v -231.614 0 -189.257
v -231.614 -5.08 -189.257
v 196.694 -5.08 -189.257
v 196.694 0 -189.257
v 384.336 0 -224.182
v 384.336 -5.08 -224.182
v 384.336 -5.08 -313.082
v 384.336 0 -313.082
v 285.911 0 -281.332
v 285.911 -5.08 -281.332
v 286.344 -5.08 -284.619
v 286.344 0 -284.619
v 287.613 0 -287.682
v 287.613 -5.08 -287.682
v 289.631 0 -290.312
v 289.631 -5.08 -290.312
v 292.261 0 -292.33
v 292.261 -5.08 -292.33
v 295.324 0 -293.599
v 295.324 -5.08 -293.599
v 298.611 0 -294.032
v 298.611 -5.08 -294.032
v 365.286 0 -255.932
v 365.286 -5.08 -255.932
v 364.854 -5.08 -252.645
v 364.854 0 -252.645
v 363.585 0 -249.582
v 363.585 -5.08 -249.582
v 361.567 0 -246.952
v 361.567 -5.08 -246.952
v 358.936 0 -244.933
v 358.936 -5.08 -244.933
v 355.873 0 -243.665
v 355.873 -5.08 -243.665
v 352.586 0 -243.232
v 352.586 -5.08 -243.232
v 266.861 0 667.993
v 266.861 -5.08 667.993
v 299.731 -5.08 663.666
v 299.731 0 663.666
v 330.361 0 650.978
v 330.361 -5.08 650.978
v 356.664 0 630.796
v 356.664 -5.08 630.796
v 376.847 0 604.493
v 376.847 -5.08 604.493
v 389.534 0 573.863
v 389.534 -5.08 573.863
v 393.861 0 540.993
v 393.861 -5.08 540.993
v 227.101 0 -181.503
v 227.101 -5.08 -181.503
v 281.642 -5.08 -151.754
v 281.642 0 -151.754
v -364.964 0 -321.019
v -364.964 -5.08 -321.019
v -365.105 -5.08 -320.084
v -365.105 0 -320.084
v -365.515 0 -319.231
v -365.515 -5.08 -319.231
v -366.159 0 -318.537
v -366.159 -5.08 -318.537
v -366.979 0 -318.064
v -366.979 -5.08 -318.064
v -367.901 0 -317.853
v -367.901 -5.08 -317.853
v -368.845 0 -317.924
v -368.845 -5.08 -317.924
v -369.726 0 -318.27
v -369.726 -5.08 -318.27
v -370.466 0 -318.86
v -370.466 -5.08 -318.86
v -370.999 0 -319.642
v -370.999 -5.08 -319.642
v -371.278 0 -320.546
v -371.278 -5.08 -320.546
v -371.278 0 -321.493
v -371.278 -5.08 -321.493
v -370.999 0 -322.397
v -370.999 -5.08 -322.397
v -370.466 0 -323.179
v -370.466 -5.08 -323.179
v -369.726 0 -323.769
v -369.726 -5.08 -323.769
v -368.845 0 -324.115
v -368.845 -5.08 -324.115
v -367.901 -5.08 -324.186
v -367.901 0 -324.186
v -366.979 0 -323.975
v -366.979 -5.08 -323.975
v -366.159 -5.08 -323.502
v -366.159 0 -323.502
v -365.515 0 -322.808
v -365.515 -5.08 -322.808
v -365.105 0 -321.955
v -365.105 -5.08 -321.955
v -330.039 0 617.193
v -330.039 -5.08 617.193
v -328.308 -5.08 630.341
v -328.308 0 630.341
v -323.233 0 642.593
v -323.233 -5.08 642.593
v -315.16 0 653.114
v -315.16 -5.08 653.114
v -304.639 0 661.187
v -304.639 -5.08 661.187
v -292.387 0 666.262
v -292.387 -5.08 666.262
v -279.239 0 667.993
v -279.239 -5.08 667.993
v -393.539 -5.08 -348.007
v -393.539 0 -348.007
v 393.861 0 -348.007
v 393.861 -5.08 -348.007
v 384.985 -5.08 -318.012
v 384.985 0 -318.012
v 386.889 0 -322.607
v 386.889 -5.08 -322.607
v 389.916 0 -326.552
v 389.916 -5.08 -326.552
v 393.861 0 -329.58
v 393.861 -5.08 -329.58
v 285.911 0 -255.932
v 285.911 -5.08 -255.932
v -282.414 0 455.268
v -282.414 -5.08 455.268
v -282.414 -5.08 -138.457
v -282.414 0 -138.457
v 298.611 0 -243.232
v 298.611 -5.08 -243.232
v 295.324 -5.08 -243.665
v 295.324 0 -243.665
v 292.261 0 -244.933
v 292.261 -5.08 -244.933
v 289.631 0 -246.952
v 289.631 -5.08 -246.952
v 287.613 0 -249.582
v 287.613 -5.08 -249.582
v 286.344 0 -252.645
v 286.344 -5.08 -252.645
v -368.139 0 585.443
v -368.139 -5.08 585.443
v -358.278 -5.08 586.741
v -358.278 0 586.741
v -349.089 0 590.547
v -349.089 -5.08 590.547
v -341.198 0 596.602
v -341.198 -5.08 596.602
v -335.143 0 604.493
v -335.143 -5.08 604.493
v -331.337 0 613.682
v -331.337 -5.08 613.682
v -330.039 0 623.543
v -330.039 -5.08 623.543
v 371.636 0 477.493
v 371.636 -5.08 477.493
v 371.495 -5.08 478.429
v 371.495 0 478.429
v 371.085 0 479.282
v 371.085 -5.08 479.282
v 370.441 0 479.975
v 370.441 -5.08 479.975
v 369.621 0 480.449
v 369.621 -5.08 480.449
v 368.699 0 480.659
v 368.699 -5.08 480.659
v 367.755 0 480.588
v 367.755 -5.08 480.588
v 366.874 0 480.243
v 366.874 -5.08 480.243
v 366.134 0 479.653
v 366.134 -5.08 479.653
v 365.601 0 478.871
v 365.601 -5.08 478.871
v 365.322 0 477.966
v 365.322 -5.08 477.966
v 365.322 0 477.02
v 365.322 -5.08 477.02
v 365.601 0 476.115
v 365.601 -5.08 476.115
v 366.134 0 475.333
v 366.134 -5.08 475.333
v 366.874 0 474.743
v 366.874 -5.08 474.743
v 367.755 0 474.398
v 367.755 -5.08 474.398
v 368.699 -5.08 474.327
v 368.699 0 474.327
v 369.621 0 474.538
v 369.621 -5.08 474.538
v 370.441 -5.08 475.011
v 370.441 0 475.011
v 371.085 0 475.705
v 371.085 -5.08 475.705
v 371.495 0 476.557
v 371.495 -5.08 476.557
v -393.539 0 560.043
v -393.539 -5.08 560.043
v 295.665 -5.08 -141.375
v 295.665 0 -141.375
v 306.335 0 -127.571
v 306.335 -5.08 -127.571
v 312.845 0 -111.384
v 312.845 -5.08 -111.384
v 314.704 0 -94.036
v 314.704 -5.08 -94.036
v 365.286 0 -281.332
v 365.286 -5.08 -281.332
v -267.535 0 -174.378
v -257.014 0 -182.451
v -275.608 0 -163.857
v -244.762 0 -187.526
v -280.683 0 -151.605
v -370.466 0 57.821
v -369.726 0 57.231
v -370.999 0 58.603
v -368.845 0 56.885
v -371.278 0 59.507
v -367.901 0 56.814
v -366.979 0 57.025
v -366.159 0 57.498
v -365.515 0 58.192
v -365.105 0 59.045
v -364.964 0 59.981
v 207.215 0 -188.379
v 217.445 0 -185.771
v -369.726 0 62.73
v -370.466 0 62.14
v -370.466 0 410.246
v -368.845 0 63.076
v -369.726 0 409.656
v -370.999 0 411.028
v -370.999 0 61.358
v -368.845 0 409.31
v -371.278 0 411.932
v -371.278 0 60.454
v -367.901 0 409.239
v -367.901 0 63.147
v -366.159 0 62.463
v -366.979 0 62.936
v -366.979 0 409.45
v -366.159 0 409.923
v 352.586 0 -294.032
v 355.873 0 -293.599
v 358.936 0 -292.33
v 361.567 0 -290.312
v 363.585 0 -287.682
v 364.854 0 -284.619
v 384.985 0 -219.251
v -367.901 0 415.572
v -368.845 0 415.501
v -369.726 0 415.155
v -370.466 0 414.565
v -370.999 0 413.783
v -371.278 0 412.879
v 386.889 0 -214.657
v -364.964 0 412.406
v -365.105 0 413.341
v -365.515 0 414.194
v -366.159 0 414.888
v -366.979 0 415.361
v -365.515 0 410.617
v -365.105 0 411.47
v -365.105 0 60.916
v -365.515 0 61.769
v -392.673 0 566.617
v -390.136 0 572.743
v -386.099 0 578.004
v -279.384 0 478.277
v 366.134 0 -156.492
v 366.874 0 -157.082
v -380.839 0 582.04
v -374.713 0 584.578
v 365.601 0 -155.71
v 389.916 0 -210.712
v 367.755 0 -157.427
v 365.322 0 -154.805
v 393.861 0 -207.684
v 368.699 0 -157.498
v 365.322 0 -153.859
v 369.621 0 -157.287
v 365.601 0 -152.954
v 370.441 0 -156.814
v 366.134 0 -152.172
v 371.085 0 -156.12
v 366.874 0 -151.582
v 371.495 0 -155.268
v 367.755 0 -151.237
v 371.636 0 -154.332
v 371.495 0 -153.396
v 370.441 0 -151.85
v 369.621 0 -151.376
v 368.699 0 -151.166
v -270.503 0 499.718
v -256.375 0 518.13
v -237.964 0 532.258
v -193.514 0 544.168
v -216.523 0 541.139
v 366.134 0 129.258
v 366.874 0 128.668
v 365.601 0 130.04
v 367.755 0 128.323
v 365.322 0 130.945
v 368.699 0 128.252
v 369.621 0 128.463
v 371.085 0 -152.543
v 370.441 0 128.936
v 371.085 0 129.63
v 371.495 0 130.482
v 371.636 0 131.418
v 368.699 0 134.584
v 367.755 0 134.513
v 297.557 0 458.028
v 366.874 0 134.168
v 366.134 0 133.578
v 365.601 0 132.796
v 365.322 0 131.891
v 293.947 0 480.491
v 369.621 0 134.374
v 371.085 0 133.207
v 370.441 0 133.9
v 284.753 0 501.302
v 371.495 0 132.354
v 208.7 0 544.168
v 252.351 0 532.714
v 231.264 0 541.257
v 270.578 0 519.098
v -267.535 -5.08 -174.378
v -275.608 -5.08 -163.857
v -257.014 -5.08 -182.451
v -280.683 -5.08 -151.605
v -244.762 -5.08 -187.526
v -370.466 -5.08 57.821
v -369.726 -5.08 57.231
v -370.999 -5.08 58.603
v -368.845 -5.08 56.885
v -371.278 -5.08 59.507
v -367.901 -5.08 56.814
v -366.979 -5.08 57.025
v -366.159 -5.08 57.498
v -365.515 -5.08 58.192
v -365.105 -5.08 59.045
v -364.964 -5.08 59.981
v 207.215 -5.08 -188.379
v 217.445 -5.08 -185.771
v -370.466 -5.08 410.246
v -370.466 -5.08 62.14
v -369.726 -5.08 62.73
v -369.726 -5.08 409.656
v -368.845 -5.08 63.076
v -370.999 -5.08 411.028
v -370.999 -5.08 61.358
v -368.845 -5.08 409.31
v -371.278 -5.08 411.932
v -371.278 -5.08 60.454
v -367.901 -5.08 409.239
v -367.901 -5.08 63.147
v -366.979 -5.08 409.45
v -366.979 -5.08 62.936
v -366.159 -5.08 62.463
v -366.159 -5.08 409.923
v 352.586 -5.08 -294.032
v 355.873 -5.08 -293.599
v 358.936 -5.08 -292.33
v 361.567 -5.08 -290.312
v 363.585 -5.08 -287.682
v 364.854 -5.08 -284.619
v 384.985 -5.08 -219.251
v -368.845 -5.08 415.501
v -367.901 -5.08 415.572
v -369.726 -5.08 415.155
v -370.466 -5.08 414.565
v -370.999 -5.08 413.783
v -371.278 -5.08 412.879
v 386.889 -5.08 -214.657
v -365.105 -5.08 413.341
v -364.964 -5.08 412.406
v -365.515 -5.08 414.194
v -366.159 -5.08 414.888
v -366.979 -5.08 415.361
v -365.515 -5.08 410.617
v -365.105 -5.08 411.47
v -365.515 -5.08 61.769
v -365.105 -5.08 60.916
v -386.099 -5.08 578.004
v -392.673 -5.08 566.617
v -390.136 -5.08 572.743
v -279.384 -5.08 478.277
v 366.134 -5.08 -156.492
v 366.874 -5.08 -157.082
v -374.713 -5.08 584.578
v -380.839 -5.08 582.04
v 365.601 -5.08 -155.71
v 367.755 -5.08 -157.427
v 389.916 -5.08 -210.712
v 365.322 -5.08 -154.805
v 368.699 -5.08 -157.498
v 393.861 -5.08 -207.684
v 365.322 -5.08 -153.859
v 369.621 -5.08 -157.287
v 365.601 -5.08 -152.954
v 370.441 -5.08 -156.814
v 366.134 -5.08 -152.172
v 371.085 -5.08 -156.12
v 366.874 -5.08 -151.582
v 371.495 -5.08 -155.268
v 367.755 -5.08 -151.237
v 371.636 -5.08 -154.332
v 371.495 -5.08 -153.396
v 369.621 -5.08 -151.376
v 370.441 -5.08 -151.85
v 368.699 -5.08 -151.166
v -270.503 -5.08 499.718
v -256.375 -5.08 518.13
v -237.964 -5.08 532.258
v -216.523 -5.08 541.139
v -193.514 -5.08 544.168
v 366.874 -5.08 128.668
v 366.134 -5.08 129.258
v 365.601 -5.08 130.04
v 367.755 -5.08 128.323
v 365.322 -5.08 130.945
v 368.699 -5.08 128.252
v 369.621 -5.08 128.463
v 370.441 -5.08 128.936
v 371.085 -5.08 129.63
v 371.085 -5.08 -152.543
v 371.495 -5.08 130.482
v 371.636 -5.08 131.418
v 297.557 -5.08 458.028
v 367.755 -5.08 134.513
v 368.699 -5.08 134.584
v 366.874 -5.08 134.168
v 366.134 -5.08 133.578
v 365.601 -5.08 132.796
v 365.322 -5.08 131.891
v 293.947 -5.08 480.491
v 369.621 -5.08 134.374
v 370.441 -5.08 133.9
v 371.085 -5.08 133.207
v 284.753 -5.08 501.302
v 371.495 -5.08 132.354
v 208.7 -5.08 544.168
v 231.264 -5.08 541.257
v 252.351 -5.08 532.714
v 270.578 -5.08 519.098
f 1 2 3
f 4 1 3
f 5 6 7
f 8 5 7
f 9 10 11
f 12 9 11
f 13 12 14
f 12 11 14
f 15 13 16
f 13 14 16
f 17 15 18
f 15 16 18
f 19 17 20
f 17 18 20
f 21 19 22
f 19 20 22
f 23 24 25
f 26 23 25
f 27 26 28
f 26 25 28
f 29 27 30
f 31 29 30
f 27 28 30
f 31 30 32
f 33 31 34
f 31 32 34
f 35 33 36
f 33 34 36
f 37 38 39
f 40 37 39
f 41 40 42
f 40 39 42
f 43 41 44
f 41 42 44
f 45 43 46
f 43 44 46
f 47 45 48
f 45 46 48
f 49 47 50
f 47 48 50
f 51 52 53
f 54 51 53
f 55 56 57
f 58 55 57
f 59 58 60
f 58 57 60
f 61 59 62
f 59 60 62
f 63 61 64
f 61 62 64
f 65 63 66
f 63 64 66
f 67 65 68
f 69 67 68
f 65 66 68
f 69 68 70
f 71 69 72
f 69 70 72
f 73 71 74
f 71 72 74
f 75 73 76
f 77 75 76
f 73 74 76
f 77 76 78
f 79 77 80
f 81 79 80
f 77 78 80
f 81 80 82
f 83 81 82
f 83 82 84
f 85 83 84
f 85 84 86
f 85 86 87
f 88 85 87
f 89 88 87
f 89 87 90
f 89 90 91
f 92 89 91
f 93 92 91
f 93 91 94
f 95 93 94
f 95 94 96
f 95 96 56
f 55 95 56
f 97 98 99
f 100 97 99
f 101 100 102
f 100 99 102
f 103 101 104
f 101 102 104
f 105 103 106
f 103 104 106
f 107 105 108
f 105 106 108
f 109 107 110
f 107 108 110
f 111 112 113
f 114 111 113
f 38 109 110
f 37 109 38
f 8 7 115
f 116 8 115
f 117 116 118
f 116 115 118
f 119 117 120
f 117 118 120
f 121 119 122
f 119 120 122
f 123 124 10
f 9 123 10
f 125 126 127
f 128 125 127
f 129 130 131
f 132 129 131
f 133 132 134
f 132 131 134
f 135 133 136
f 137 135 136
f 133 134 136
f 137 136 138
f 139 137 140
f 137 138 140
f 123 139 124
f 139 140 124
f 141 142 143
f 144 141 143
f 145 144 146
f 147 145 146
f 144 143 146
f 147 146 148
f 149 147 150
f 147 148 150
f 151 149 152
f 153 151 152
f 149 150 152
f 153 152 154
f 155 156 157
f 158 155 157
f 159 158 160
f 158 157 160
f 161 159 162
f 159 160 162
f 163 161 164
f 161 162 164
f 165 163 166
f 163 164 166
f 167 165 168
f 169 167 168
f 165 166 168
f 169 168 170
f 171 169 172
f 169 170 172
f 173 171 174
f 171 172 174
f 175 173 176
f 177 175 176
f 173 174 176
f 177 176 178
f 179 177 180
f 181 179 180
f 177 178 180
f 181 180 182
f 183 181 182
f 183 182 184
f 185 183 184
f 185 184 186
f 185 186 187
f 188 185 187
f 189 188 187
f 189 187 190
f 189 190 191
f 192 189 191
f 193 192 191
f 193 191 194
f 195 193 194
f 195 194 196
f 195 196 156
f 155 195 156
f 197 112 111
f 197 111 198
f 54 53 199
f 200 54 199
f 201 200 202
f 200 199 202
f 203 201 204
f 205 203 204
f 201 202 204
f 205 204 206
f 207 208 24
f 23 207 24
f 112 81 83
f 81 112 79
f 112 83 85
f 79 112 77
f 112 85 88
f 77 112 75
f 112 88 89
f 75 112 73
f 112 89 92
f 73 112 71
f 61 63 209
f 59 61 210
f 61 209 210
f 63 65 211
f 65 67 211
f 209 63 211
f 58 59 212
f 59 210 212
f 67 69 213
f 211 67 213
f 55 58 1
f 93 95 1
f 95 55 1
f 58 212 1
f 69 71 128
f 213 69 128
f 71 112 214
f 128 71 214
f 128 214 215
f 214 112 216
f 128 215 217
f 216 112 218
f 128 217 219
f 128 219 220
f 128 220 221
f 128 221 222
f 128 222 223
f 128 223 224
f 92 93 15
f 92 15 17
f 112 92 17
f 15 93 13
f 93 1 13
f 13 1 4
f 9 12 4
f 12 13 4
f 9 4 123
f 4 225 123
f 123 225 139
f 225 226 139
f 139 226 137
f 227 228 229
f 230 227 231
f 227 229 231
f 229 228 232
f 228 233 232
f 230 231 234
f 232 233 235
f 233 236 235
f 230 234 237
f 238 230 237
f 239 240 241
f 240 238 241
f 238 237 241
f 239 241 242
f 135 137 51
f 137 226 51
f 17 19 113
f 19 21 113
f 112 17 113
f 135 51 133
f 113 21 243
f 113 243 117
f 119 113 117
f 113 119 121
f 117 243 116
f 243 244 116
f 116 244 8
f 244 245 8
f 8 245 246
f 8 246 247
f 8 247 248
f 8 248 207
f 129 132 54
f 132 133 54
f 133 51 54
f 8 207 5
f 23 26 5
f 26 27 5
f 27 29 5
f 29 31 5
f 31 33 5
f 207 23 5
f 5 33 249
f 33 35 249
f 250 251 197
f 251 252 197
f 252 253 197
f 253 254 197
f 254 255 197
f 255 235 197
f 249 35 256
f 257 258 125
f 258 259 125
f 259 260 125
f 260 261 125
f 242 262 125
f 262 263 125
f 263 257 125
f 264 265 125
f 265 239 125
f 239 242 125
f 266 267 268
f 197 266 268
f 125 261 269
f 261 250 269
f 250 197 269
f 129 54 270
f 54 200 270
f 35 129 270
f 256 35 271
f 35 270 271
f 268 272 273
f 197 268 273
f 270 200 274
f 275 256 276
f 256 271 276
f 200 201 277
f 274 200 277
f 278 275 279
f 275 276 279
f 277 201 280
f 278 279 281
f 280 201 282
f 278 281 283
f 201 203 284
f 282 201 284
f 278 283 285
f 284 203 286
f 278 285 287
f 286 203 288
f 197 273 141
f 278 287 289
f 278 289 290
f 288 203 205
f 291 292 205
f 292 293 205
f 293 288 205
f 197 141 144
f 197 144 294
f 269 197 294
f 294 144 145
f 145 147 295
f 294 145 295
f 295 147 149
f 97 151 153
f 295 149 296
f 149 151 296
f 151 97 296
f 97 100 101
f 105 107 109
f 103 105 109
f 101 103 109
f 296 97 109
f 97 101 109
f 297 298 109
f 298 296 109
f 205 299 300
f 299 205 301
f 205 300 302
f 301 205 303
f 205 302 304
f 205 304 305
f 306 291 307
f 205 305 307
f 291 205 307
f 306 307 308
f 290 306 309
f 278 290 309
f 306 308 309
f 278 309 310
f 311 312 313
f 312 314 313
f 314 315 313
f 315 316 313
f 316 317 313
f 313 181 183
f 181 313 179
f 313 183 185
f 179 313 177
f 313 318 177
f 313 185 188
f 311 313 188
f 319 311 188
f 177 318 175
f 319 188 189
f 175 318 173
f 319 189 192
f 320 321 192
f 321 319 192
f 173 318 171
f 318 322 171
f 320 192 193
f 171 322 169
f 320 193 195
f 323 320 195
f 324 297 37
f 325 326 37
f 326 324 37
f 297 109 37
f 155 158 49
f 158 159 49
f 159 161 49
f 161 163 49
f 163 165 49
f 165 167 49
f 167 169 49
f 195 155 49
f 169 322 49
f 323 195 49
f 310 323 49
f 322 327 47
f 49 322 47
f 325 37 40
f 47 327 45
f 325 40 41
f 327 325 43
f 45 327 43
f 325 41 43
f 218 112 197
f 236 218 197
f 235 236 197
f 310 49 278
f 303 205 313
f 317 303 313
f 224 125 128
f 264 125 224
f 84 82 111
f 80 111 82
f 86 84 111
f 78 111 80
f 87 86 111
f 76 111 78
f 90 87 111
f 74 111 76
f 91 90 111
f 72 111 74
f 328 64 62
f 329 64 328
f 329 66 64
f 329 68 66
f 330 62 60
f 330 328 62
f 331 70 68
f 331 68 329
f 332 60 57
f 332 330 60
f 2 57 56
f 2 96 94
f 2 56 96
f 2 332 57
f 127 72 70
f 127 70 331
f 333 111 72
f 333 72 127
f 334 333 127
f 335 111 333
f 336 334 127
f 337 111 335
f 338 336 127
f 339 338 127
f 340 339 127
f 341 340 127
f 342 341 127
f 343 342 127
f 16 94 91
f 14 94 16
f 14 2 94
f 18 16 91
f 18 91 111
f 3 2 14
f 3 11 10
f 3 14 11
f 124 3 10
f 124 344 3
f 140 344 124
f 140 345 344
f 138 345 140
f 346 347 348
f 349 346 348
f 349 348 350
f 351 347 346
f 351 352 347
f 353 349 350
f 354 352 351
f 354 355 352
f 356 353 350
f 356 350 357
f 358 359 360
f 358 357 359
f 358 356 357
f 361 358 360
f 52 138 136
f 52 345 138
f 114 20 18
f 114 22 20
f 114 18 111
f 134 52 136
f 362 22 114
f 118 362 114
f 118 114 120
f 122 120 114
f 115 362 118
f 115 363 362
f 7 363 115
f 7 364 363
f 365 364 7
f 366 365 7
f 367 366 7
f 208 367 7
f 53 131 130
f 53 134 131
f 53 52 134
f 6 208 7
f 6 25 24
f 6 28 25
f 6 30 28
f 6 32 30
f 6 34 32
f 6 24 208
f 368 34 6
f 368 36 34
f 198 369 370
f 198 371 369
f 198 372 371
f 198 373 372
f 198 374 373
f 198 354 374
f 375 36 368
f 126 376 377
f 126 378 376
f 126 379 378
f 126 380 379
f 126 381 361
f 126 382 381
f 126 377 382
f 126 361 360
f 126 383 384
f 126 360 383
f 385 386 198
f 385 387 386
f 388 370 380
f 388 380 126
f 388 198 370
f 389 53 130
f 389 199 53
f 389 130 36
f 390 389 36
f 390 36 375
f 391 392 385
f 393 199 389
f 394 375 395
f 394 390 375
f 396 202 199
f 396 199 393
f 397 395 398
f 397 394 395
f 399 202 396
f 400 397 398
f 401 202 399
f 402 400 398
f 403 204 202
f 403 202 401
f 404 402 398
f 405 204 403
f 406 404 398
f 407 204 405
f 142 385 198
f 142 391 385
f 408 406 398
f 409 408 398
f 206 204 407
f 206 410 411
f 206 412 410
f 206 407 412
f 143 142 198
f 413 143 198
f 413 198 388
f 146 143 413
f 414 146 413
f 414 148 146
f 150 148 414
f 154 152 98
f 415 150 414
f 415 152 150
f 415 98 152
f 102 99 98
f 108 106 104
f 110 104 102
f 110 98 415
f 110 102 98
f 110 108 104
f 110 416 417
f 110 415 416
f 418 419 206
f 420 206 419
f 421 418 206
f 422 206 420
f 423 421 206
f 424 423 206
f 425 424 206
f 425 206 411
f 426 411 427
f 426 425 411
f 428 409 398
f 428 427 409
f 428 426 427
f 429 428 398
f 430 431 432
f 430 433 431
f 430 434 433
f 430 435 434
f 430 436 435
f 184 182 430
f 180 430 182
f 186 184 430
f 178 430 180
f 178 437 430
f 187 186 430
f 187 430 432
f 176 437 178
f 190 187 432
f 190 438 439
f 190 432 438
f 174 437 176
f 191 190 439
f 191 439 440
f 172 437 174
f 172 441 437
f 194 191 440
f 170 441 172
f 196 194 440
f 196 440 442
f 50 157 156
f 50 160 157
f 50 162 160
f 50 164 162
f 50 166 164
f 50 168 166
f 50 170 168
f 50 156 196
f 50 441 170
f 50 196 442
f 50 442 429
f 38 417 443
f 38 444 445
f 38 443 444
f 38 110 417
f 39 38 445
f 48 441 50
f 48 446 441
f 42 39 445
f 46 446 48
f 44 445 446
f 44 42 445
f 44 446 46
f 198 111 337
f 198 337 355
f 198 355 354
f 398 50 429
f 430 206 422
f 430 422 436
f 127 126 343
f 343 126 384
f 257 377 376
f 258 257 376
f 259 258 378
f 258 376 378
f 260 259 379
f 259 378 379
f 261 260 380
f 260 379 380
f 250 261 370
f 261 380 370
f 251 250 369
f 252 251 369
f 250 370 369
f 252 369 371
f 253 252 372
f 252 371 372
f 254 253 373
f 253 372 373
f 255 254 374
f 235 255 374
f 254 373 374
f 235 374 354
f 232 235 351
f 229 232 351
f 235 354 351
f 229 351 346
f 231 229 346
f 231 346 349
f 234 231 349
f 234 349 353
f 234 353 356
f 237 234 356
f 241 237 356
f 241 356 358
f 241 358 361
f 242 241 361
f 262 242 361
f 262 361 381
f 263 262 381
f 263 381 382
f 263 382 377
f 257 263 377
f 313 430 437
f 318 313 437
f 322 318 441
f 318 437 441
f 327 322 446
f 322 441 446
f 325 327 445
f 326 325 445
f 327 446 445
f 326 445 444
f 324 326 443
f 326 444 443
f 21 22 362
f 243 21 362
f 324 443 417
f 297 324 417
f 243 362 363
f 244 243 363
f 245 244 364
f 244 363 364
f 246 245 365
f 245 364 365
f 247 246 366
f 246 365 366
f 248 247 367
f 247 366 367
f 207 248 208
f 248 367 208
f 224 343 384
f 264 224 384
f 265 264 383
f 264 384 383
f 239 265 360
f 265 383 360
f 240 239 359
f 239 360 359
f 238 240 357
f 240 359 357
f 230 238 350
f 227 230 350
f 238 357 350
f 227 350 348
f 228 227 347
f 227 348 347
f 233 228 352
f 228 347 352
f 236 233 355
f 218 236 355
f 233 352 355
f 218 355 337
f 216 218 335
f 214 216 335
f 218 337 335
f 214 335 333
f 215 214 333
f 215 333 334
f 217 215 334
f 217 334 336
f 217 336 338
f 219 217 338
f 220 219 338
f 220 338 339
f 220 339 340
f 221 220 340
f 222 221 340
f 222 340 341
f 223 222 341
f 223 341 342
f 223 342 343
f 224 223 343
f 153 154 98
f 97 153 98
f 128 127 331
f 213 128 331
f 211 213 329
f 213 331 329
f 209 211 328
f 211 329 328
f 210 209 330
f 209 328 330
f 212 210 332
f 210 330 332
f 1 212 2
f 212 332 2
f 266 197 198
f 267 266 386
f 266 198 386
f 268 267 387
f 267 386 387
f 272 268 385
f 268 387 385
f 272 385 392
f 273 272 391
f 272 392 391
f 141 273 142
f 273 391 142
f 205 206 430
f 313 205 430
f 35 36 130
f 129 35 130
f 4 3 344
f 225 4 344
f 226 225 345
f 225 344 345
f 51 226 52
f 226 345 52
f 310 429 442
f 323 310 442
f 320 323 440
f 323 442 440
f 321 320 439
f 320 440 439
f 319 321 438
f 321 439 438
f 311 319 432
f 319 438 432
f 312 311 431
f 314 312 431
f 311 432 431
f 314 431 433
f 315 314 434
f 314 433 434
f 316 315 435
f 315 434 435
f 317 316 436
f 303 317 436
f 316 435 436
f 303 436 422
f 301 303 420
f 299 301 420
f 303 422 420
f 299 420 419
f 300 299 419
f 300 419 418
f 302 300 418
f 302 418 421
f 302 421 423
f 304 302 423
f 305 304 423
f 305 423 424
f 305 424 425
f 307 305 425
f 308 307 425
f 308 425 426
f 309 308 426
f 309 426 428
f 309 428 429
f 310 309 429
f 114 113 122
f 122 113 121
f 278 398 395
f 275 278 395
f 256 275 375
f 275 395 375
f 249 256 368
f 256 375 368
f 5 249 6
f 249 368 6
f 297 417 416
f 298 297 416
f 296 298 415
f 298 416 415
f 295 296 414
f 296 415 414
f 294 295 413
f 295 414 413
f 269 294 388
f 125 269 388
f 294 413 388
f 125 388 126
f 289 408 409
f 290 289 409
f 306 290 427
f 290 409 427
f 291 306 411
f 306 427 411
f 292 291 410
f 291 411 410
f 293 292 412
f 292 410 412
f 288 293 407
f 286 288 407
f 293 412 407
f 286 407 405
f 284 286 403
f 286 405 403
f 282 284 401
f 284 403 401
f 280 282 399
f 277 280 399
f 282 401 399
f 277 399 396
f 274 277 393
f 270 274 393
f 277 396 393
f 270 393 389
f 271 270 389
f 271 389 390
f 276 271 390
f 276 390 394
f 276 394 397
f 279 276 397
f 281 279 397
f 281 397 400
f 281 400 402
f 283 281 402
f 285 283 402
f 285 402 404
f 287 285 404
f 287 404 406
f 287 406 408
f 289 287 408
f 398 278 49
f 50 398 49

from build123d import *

# Parameters (mm, degrees)
F0_W      = 787.4
F0_H      = 1016
F1_DEPTH  = 5.08
F3_DEPTH  = 5.081
F5_DEPTH  = 5.081
F7_DEPTH  = 5.081
F9_DEPTH  = 5.081
F11_DEPTH = 5.081
F12_DEPTH = 25.4
F14_DEPTH = 5.081
F16_DEPTH = 5.081
F17_R     = 3.175
F18_DEPTH = 5.081


with BuildPart() as f1:
    # F0 (on Front) → F1 (new body)
    with BuildSketch(Plane.XZ):
        with Locations((0.161311, 159.993043)):
            Rectangle(F0_W, F0_H)
    extrude(amount=F1_DEPTH)

    # F2 (on face) → F3 (cut, through all)
    with BuildSketch(Plane.XZ.offset(5.08)):
        with BuildLine():
            Line((352.586311, -243.231957), (298.611311, -243.231957))
            ThreePointArc((298.611311, -243.231957), (289.631055, -246.951701), (285.911311, -255.931957))
            Line((285.911311, -255.931957), (285.911311, -281.331957))
            ThreePointArc((285.911311, -281.331957), (289.631055, -290.312213), (298.611311, -294.031957))
            Line((298.611311, -294.031957), (352.586311, -294.031957))
            ThreePointArc((352.586311, -294.031957), (361.566567, -290.312213), (365.286311, -281.331957))
            Line((365.286311, -281.331957), (365.286311, -255.931957))
            ThreePointArc((365.286311, -255.931957), (361.566567, -246.951701), (352.586311, -243.231957))
        make_face()
    extrude(amount=-F3_DEPTH, mode=Mode.SUBTRACT)

    # F4 (on face) → F5 (cut, through all)
    with BuildSketch(Plane.XZ.offset(5.08)):
        with BuildLine():
            ThreePointArc((403.386311, -205.131957), (389.915926, -210.711573), (384.336311, -224.181957))
            Line((384.336311, -224.181957), (384.336311, -313.081957))
            ThreePointArc((384.336311, -313.081957), (389.915926, -326.552341), (403.386311, -332.131957))
            Line((403.386311, -332.131957), (403.386311, -205.131957))
        make_face()
    extrude(amount=-F5_DEPTH, mode=Mode.SUBTRACT)

    # F6 (on face) → F7 (cut, through all)
    with BuildSketch(Plane.XZ.offset(5.08)):
        with BuildLine():
            Line((208.69992, 544.168043), (-193.513689, 544.168043))
            ThreePointArc((-193.513689, 544.168043), (-256.375482, 518.129836), (-282.413689, 455.268043))
            Line((-282.413689, 455.268043), (-282.413689, -138.456957))
            ThreePointArc((-282.413689, -138.456957), (-267.534714, -174.377981), (-231.613689, -189.256957))
            Line((-231.613689, -189.256957), (196.694191, -189.256957))
            ThreePointArc((196.694191, -189.256957), (212.384245, -187.288024), (227.101301, -181.503326))
            Line((227.101301, -181.503326), (281.64154, -151.754104))
            ThreePointArc((281.64154, -151.754104), (306.334633, -127.570652), (314.703824, -94.036418))
            Line((314.703824, -94.036418), (297.557071, 458.027888))
            ThreePointArc((297.557071, 458.027888), (270.578268, 519.098131), (208.69992, 544.168043))
        make_face()
    extrude(amount=-F7_DEPTH, mode=Mode.SUBTRACT)

    # F8 (on face) → F9 (cut, through all)
    with BuildSketch(Plane.XZ.offset(5.08)):
        with BuildLine():
            Line((-330.038689, 667.993043), (-393.538689, 667.993043))
            Line((-393.538689, 667.993043), (-393.538689, 585.443043))
            Line((-393.538689, 585.443043), (-368.138689, 585.443043))
            ThreePointArc((-368.138689, 585.443043), (-341.197921, 596.602275), (-330.038689, 623.543043))
            Line((-330.038689, 623.543043), (-330.038689, 667.993043))
        make_face()
    extrude(amount=-F9_DEPTH, mode=Mode.SUBTRACT)

    # F10 (on face) → F11 (cut, through all)
    with BuildSketch(Plane.XZ.offset(5.08)):
        with BuildLine():
            ThreePointArc((-330.038689, 617.193043), (-315.159714, 653.114068), (-279.238689, 667.993043))
            Line((-279.238689, 667.993043), (-330.038689, 667.993043))
            Line((-330.038689, 667.993043), (-330.038689, 617.193043))
        make_face()
    extrude(amount=-F11_DEPTH, mode=Mode.SUBTRACT)

    # F10 (on face) → F12 (cut)
    with BuildSketch(Plane.XZ.offset(5.08)):
        with BuildLine():
            ThreePointArc((-330.038689, 617.193043), (-315.159714, 653.114068), (-279.238689, 667.993043))
            Line((-279.238689, 667.993043), (-330.038689, 667.993043))
            Line((-330.038689, 667.993043), (-330.038689, 617.193043))
        make_face()
    extrude(amount=-F12_DEPTH, mode=Mode.SUBTRACT)

    # F13 (on face) → F14 (cut, through all)
    with BuildSketch(Plane.XZ.offset(5.08)):
        with BuildLine():
            ThreePointArc((-393.538689, 560.043043), (-386.099202, 578.003555), (-368.138689, 585.443043))
            Line((-368.138689, 585.443043), (-393.538689, 585.443043))
            Line((-393.538689, 585.443043), (-393.538689, 560.043043))
        make_face()
    extrude(amount=-F14_DEPTH, mode=Mode.SUBTRACT)

    # F15 (on face) → F16 (cut, through all)
    with BuildSketch(Plane.XZ.offset(5.08)):
        with BuildLine():
            ThreePointArc((266.861311, 667.993043), (356.663872, 630.795604), (393.861311, 540.993043))
            Line((393.861311, 540.993043), (393.861311, 667.993043))
            Line((393.861311, 667.993043), (266.861311, 667.993043))
        make_face()
    extrude(amount=-F16_DEPTH, mode=Mode.SUBTRACT)

    # F17 (on face) → F18 (cut, through all)
    with BuildSketch(Plane.XZ.offset(5.08)):
        with Locations((368.461311, 477.493043)):
            Circle(F17_R)
        with Locations((368.461311, 131.418043)):
            Circle(F17_R)
        with Locations((368.461311, -154.331957)):
            Circle(F17_R)
        with Locations((-368.138689, -321.019457)):
            Circle(F17_R)
        with Locations((-368.138689, 59.980543)):
            Circle(F17_R)
        with Locations((-368.138689, 412.405543)):
            Circle(F17_R)
    extrude(amount=-F18_DEPTH, mode=Mode.SUBTRACT)


solid = f1.part
